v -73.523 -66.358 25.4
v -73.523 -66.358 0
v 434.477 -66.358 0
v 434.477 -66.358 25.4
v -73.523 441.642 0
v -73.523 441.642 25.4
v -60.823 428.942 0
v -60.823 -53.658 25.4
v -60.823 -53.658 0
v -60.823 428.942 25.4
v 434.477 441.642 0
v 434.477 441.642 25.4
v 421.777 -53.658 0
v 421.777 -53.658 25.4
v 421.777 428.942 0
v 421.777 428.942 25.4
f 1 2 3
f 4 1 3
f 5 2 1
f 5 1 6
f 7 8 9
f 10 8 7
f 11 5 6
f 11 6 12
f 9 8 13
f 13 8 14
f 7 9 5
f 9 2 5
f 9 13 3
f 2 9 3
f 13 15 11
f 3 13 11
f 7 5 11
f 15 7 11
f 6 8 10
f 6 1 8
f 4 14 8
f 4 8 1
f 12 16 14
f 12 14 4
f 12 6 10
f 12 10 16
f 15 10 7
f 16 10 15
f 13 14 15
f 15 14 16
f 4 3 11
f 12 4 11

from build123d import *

# Parameters (mm, degrees)
F0_W     = 508
F0_H     = 508
F1_DEPTH = 25.4
F2_T     = -12.7
F3_DEPTH = 1396.1044084281


with BuildPart() as f1:
    # F0 (on Top) → F1 (new body)
    with BuildSketch(Plane.XY):
        with Locations((180.4774918556, 187.6424022913)):
            Rectangle(F0_W, F0_H)
    extrude(amount=F1_DEPTH)

    # F2
    f2_openings = [f1.faces().sort_by_distance(p)[0] for p in [
        (180.477492, 187.642402, 25.4),
    ]]
    offset(amount=F2_T, openings=f2_openings)

    # F3 (cut): a face of the model
    f3_faces = [f1.faces().sort_by_distance(p)[0] for p in [
        (180.4774918556, 187.6424022913, 12.7),
    ]]
    extrude(f3_faces, amount=-F3_DEPTH, mode=Mode.SUBTRACT)


solid = f1.part
